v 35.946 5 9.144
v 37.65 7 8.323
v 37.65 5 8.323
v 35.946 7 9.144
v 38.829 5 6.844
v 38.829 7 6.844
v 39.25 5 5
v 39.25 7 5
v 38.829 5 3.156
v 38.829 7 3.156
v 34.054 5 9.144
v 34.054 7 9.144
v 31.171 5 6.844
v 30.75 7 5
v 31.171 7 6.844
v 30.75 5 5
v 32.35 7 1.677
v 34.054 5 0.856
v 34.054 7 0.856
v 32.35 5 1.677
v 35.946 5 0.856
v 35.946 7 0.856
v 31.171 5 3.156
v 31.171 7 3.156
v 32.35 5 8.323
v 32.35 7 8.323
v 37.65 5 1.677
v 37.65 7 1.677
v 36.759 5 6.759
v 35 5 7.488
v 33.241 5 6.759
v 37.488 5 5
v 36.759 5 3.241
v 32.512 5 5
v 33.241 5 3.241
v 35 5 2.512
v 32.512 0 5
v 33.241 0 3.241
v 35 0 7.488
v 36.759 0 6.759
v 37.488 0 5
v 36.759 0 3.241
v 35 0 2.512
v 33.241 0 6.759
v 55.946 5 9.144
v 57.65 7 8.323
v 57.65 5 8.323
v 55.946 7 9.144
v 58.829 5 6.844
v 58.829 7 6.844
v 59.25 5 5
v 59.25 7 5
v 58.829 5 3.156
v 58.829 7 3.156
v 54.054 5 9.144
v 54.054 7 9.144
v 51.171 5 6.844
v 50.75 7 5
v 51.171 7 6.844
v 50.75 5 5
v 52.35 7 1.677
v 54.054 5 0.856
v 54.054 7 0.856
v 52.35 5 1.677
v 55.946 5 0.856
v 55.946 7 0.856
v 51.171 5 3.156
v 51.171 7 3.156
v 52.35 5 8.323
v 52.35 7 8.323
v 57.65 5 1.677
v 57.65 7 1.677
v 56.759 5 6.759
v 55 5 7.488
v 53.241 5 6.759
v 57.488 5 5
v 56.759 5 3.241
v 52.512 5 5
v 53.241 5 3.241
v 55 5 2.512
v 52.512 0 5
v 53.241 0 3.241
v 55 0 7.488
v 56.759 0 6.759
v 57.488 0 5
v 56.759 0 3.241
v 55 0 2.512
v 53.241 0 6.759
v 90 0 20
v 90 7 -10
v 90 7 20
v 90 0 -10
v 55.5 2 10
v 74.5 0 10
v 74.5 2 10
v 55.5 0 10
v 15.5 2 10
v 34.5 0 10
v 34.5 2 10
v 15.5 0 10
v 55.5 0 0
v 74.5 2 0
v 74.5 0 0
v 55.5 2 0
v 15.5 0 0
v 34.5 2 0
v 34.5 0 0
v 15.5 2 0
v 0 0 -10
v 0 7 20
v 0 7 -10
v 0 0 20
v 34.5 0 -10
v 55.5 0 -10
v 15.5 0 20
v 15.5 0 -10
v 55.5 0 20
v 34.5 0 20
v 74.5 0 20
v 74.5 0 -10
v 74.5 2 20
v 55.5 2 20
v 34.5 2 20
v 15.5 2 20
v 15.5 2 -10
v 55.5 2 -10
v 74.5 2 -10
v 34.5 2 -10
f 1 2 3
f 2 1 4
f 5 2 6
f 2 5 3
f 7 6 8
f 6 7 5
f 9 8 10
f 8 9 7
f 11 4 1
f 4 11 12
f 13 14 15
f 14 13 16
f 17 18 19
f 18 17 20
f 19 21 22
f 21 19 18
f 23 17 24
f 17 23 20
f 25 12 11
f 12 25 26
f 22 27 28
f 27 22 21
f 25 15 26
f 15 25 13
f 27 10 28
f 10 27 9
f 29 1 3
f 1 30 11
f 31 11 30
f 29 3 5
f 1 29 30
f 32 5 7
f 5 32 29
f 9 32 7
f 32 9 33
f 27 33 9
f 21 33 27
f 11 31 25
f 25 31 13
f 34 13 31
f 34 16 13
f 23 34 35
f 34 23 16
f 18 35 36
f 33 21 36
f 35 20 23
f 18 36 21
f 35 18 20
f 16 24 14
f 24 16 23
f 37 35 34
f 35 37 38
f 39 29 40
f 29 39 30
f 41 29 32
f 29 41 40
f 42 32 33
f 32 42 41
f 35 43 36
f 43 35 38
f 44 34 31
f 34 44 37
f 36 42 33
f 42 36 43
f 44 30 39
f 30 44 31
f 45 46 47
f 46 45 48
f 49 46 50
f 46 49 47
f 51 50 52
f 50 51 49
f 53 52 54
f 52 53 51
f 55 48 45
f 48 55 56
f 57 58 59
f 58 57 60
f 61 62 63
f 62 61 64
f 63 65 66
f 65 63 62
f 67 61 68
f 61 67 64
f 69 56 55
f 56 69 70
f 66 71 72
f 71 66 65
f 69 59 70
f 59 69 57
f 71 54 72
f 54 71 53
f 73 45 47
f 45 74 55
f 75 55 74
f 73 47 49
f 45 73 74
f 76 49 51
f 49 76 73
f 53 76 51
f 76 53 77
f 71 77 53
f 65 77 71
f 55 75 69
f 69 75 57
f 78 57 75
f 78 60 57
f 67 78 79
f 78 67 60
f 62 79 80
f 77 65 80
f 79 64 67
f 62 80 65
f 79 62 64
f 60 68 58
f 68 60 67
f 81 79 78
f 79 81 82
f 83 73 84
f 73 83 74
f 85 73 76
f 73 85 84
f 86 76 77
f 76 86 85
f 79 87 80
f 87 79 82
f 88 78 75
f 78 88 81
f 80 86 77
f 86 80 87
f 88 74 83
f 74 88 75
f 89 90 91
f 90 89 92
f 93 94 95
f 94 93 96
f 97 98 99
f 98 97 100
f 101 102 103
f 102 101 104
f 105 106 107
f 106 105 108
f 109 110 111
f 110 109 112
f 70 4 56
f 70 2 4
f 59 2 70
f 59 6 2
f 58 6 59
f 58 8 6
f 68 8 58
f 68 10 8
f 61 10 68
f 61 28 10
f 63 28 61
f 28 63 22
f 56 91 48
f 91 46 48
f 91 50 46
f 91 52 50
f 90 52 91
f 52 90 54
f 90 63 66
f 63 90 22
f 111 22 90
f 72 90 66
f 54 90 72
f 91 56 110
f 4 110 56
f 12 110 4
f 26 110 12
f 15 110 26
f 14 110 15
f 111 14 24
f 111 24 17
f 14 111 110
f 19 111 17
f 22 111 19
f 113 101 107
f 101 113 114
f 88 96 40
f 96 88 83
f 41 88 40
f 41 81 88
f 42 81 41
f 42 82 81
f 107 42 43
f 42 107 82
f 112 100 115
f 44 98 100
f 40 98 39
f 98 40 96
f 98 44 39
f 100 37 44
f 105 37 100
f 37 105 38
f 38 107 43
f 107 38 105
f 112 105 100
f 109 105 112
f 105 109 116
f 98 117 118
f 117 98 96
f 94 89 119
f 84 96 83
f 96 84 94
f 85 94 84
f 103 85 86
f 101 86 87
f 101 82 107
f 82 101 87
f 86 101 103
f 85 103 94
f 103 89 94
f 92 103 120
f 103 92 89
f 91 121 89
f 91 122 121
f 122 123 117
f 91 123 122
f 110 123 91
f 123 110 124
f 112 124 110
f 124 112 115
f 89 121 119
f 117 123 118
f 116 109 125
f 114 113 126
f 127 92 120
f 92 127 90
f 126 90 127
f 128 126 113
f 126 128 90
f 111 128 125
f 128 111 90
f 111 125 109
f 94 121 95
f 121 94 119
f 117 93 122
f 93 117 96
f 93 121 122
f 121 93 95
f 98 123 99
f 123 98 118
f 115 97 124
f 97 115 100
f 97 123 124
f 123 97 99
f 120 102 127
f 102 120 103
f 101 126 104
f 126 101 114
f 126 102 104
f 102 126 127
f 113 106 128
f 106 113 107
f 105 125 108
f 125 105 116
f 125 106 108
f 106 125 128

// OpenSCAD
include <MCAD/nuts_and_bolts.scad>

hole_dist = 20;
corner_width=19;
corner_inset=2;
main_size=[90,7,10];
support_size=[90,7,10];
difference()
{
    cube(main_size); 
    translate([main_size.x/2-hole_dist/2,main_size.y-2,main_size.z/2]) rotate([90,0,0]) boltHole(5,MM, 10);
    translate([main_size.x/2+hole_dist/2,main_size.y-2,main_size.z/2]) rotate([90,0,0]) boltHole(5,MM, 10);
}
difference()
{
    union()
    {
        translate([0,-support_size.y+main_size.y,main_size.z]) cube(support_size);
        translate([0,-support_size.y+main_size.y,-main_size.z]) cube(support_size);
    }
    
    translate([support_size.x/2-corner_width/2+20,-corner_width+corner_inset,main_size.z]) cube([corner_width,corner_width,support_size.z]); 
    translate([support_size.x/2-corner_width/2-20,-corner_width+corner_inset,main_size.z]) cube([corner_width,corner_width,support_size.z]);
    
    translate([support_size.x/2-corner_width/2+20,-corner_width+corner_inset,-main_size.z]) cube([corner_width,corner_width,support_size.z]); 
    translate([support_size.x/2-corner_width/2-20,-corner_width+corner_inset,-main_size.z]) cube([corner_width,corner_width,support_size.z]);
}
